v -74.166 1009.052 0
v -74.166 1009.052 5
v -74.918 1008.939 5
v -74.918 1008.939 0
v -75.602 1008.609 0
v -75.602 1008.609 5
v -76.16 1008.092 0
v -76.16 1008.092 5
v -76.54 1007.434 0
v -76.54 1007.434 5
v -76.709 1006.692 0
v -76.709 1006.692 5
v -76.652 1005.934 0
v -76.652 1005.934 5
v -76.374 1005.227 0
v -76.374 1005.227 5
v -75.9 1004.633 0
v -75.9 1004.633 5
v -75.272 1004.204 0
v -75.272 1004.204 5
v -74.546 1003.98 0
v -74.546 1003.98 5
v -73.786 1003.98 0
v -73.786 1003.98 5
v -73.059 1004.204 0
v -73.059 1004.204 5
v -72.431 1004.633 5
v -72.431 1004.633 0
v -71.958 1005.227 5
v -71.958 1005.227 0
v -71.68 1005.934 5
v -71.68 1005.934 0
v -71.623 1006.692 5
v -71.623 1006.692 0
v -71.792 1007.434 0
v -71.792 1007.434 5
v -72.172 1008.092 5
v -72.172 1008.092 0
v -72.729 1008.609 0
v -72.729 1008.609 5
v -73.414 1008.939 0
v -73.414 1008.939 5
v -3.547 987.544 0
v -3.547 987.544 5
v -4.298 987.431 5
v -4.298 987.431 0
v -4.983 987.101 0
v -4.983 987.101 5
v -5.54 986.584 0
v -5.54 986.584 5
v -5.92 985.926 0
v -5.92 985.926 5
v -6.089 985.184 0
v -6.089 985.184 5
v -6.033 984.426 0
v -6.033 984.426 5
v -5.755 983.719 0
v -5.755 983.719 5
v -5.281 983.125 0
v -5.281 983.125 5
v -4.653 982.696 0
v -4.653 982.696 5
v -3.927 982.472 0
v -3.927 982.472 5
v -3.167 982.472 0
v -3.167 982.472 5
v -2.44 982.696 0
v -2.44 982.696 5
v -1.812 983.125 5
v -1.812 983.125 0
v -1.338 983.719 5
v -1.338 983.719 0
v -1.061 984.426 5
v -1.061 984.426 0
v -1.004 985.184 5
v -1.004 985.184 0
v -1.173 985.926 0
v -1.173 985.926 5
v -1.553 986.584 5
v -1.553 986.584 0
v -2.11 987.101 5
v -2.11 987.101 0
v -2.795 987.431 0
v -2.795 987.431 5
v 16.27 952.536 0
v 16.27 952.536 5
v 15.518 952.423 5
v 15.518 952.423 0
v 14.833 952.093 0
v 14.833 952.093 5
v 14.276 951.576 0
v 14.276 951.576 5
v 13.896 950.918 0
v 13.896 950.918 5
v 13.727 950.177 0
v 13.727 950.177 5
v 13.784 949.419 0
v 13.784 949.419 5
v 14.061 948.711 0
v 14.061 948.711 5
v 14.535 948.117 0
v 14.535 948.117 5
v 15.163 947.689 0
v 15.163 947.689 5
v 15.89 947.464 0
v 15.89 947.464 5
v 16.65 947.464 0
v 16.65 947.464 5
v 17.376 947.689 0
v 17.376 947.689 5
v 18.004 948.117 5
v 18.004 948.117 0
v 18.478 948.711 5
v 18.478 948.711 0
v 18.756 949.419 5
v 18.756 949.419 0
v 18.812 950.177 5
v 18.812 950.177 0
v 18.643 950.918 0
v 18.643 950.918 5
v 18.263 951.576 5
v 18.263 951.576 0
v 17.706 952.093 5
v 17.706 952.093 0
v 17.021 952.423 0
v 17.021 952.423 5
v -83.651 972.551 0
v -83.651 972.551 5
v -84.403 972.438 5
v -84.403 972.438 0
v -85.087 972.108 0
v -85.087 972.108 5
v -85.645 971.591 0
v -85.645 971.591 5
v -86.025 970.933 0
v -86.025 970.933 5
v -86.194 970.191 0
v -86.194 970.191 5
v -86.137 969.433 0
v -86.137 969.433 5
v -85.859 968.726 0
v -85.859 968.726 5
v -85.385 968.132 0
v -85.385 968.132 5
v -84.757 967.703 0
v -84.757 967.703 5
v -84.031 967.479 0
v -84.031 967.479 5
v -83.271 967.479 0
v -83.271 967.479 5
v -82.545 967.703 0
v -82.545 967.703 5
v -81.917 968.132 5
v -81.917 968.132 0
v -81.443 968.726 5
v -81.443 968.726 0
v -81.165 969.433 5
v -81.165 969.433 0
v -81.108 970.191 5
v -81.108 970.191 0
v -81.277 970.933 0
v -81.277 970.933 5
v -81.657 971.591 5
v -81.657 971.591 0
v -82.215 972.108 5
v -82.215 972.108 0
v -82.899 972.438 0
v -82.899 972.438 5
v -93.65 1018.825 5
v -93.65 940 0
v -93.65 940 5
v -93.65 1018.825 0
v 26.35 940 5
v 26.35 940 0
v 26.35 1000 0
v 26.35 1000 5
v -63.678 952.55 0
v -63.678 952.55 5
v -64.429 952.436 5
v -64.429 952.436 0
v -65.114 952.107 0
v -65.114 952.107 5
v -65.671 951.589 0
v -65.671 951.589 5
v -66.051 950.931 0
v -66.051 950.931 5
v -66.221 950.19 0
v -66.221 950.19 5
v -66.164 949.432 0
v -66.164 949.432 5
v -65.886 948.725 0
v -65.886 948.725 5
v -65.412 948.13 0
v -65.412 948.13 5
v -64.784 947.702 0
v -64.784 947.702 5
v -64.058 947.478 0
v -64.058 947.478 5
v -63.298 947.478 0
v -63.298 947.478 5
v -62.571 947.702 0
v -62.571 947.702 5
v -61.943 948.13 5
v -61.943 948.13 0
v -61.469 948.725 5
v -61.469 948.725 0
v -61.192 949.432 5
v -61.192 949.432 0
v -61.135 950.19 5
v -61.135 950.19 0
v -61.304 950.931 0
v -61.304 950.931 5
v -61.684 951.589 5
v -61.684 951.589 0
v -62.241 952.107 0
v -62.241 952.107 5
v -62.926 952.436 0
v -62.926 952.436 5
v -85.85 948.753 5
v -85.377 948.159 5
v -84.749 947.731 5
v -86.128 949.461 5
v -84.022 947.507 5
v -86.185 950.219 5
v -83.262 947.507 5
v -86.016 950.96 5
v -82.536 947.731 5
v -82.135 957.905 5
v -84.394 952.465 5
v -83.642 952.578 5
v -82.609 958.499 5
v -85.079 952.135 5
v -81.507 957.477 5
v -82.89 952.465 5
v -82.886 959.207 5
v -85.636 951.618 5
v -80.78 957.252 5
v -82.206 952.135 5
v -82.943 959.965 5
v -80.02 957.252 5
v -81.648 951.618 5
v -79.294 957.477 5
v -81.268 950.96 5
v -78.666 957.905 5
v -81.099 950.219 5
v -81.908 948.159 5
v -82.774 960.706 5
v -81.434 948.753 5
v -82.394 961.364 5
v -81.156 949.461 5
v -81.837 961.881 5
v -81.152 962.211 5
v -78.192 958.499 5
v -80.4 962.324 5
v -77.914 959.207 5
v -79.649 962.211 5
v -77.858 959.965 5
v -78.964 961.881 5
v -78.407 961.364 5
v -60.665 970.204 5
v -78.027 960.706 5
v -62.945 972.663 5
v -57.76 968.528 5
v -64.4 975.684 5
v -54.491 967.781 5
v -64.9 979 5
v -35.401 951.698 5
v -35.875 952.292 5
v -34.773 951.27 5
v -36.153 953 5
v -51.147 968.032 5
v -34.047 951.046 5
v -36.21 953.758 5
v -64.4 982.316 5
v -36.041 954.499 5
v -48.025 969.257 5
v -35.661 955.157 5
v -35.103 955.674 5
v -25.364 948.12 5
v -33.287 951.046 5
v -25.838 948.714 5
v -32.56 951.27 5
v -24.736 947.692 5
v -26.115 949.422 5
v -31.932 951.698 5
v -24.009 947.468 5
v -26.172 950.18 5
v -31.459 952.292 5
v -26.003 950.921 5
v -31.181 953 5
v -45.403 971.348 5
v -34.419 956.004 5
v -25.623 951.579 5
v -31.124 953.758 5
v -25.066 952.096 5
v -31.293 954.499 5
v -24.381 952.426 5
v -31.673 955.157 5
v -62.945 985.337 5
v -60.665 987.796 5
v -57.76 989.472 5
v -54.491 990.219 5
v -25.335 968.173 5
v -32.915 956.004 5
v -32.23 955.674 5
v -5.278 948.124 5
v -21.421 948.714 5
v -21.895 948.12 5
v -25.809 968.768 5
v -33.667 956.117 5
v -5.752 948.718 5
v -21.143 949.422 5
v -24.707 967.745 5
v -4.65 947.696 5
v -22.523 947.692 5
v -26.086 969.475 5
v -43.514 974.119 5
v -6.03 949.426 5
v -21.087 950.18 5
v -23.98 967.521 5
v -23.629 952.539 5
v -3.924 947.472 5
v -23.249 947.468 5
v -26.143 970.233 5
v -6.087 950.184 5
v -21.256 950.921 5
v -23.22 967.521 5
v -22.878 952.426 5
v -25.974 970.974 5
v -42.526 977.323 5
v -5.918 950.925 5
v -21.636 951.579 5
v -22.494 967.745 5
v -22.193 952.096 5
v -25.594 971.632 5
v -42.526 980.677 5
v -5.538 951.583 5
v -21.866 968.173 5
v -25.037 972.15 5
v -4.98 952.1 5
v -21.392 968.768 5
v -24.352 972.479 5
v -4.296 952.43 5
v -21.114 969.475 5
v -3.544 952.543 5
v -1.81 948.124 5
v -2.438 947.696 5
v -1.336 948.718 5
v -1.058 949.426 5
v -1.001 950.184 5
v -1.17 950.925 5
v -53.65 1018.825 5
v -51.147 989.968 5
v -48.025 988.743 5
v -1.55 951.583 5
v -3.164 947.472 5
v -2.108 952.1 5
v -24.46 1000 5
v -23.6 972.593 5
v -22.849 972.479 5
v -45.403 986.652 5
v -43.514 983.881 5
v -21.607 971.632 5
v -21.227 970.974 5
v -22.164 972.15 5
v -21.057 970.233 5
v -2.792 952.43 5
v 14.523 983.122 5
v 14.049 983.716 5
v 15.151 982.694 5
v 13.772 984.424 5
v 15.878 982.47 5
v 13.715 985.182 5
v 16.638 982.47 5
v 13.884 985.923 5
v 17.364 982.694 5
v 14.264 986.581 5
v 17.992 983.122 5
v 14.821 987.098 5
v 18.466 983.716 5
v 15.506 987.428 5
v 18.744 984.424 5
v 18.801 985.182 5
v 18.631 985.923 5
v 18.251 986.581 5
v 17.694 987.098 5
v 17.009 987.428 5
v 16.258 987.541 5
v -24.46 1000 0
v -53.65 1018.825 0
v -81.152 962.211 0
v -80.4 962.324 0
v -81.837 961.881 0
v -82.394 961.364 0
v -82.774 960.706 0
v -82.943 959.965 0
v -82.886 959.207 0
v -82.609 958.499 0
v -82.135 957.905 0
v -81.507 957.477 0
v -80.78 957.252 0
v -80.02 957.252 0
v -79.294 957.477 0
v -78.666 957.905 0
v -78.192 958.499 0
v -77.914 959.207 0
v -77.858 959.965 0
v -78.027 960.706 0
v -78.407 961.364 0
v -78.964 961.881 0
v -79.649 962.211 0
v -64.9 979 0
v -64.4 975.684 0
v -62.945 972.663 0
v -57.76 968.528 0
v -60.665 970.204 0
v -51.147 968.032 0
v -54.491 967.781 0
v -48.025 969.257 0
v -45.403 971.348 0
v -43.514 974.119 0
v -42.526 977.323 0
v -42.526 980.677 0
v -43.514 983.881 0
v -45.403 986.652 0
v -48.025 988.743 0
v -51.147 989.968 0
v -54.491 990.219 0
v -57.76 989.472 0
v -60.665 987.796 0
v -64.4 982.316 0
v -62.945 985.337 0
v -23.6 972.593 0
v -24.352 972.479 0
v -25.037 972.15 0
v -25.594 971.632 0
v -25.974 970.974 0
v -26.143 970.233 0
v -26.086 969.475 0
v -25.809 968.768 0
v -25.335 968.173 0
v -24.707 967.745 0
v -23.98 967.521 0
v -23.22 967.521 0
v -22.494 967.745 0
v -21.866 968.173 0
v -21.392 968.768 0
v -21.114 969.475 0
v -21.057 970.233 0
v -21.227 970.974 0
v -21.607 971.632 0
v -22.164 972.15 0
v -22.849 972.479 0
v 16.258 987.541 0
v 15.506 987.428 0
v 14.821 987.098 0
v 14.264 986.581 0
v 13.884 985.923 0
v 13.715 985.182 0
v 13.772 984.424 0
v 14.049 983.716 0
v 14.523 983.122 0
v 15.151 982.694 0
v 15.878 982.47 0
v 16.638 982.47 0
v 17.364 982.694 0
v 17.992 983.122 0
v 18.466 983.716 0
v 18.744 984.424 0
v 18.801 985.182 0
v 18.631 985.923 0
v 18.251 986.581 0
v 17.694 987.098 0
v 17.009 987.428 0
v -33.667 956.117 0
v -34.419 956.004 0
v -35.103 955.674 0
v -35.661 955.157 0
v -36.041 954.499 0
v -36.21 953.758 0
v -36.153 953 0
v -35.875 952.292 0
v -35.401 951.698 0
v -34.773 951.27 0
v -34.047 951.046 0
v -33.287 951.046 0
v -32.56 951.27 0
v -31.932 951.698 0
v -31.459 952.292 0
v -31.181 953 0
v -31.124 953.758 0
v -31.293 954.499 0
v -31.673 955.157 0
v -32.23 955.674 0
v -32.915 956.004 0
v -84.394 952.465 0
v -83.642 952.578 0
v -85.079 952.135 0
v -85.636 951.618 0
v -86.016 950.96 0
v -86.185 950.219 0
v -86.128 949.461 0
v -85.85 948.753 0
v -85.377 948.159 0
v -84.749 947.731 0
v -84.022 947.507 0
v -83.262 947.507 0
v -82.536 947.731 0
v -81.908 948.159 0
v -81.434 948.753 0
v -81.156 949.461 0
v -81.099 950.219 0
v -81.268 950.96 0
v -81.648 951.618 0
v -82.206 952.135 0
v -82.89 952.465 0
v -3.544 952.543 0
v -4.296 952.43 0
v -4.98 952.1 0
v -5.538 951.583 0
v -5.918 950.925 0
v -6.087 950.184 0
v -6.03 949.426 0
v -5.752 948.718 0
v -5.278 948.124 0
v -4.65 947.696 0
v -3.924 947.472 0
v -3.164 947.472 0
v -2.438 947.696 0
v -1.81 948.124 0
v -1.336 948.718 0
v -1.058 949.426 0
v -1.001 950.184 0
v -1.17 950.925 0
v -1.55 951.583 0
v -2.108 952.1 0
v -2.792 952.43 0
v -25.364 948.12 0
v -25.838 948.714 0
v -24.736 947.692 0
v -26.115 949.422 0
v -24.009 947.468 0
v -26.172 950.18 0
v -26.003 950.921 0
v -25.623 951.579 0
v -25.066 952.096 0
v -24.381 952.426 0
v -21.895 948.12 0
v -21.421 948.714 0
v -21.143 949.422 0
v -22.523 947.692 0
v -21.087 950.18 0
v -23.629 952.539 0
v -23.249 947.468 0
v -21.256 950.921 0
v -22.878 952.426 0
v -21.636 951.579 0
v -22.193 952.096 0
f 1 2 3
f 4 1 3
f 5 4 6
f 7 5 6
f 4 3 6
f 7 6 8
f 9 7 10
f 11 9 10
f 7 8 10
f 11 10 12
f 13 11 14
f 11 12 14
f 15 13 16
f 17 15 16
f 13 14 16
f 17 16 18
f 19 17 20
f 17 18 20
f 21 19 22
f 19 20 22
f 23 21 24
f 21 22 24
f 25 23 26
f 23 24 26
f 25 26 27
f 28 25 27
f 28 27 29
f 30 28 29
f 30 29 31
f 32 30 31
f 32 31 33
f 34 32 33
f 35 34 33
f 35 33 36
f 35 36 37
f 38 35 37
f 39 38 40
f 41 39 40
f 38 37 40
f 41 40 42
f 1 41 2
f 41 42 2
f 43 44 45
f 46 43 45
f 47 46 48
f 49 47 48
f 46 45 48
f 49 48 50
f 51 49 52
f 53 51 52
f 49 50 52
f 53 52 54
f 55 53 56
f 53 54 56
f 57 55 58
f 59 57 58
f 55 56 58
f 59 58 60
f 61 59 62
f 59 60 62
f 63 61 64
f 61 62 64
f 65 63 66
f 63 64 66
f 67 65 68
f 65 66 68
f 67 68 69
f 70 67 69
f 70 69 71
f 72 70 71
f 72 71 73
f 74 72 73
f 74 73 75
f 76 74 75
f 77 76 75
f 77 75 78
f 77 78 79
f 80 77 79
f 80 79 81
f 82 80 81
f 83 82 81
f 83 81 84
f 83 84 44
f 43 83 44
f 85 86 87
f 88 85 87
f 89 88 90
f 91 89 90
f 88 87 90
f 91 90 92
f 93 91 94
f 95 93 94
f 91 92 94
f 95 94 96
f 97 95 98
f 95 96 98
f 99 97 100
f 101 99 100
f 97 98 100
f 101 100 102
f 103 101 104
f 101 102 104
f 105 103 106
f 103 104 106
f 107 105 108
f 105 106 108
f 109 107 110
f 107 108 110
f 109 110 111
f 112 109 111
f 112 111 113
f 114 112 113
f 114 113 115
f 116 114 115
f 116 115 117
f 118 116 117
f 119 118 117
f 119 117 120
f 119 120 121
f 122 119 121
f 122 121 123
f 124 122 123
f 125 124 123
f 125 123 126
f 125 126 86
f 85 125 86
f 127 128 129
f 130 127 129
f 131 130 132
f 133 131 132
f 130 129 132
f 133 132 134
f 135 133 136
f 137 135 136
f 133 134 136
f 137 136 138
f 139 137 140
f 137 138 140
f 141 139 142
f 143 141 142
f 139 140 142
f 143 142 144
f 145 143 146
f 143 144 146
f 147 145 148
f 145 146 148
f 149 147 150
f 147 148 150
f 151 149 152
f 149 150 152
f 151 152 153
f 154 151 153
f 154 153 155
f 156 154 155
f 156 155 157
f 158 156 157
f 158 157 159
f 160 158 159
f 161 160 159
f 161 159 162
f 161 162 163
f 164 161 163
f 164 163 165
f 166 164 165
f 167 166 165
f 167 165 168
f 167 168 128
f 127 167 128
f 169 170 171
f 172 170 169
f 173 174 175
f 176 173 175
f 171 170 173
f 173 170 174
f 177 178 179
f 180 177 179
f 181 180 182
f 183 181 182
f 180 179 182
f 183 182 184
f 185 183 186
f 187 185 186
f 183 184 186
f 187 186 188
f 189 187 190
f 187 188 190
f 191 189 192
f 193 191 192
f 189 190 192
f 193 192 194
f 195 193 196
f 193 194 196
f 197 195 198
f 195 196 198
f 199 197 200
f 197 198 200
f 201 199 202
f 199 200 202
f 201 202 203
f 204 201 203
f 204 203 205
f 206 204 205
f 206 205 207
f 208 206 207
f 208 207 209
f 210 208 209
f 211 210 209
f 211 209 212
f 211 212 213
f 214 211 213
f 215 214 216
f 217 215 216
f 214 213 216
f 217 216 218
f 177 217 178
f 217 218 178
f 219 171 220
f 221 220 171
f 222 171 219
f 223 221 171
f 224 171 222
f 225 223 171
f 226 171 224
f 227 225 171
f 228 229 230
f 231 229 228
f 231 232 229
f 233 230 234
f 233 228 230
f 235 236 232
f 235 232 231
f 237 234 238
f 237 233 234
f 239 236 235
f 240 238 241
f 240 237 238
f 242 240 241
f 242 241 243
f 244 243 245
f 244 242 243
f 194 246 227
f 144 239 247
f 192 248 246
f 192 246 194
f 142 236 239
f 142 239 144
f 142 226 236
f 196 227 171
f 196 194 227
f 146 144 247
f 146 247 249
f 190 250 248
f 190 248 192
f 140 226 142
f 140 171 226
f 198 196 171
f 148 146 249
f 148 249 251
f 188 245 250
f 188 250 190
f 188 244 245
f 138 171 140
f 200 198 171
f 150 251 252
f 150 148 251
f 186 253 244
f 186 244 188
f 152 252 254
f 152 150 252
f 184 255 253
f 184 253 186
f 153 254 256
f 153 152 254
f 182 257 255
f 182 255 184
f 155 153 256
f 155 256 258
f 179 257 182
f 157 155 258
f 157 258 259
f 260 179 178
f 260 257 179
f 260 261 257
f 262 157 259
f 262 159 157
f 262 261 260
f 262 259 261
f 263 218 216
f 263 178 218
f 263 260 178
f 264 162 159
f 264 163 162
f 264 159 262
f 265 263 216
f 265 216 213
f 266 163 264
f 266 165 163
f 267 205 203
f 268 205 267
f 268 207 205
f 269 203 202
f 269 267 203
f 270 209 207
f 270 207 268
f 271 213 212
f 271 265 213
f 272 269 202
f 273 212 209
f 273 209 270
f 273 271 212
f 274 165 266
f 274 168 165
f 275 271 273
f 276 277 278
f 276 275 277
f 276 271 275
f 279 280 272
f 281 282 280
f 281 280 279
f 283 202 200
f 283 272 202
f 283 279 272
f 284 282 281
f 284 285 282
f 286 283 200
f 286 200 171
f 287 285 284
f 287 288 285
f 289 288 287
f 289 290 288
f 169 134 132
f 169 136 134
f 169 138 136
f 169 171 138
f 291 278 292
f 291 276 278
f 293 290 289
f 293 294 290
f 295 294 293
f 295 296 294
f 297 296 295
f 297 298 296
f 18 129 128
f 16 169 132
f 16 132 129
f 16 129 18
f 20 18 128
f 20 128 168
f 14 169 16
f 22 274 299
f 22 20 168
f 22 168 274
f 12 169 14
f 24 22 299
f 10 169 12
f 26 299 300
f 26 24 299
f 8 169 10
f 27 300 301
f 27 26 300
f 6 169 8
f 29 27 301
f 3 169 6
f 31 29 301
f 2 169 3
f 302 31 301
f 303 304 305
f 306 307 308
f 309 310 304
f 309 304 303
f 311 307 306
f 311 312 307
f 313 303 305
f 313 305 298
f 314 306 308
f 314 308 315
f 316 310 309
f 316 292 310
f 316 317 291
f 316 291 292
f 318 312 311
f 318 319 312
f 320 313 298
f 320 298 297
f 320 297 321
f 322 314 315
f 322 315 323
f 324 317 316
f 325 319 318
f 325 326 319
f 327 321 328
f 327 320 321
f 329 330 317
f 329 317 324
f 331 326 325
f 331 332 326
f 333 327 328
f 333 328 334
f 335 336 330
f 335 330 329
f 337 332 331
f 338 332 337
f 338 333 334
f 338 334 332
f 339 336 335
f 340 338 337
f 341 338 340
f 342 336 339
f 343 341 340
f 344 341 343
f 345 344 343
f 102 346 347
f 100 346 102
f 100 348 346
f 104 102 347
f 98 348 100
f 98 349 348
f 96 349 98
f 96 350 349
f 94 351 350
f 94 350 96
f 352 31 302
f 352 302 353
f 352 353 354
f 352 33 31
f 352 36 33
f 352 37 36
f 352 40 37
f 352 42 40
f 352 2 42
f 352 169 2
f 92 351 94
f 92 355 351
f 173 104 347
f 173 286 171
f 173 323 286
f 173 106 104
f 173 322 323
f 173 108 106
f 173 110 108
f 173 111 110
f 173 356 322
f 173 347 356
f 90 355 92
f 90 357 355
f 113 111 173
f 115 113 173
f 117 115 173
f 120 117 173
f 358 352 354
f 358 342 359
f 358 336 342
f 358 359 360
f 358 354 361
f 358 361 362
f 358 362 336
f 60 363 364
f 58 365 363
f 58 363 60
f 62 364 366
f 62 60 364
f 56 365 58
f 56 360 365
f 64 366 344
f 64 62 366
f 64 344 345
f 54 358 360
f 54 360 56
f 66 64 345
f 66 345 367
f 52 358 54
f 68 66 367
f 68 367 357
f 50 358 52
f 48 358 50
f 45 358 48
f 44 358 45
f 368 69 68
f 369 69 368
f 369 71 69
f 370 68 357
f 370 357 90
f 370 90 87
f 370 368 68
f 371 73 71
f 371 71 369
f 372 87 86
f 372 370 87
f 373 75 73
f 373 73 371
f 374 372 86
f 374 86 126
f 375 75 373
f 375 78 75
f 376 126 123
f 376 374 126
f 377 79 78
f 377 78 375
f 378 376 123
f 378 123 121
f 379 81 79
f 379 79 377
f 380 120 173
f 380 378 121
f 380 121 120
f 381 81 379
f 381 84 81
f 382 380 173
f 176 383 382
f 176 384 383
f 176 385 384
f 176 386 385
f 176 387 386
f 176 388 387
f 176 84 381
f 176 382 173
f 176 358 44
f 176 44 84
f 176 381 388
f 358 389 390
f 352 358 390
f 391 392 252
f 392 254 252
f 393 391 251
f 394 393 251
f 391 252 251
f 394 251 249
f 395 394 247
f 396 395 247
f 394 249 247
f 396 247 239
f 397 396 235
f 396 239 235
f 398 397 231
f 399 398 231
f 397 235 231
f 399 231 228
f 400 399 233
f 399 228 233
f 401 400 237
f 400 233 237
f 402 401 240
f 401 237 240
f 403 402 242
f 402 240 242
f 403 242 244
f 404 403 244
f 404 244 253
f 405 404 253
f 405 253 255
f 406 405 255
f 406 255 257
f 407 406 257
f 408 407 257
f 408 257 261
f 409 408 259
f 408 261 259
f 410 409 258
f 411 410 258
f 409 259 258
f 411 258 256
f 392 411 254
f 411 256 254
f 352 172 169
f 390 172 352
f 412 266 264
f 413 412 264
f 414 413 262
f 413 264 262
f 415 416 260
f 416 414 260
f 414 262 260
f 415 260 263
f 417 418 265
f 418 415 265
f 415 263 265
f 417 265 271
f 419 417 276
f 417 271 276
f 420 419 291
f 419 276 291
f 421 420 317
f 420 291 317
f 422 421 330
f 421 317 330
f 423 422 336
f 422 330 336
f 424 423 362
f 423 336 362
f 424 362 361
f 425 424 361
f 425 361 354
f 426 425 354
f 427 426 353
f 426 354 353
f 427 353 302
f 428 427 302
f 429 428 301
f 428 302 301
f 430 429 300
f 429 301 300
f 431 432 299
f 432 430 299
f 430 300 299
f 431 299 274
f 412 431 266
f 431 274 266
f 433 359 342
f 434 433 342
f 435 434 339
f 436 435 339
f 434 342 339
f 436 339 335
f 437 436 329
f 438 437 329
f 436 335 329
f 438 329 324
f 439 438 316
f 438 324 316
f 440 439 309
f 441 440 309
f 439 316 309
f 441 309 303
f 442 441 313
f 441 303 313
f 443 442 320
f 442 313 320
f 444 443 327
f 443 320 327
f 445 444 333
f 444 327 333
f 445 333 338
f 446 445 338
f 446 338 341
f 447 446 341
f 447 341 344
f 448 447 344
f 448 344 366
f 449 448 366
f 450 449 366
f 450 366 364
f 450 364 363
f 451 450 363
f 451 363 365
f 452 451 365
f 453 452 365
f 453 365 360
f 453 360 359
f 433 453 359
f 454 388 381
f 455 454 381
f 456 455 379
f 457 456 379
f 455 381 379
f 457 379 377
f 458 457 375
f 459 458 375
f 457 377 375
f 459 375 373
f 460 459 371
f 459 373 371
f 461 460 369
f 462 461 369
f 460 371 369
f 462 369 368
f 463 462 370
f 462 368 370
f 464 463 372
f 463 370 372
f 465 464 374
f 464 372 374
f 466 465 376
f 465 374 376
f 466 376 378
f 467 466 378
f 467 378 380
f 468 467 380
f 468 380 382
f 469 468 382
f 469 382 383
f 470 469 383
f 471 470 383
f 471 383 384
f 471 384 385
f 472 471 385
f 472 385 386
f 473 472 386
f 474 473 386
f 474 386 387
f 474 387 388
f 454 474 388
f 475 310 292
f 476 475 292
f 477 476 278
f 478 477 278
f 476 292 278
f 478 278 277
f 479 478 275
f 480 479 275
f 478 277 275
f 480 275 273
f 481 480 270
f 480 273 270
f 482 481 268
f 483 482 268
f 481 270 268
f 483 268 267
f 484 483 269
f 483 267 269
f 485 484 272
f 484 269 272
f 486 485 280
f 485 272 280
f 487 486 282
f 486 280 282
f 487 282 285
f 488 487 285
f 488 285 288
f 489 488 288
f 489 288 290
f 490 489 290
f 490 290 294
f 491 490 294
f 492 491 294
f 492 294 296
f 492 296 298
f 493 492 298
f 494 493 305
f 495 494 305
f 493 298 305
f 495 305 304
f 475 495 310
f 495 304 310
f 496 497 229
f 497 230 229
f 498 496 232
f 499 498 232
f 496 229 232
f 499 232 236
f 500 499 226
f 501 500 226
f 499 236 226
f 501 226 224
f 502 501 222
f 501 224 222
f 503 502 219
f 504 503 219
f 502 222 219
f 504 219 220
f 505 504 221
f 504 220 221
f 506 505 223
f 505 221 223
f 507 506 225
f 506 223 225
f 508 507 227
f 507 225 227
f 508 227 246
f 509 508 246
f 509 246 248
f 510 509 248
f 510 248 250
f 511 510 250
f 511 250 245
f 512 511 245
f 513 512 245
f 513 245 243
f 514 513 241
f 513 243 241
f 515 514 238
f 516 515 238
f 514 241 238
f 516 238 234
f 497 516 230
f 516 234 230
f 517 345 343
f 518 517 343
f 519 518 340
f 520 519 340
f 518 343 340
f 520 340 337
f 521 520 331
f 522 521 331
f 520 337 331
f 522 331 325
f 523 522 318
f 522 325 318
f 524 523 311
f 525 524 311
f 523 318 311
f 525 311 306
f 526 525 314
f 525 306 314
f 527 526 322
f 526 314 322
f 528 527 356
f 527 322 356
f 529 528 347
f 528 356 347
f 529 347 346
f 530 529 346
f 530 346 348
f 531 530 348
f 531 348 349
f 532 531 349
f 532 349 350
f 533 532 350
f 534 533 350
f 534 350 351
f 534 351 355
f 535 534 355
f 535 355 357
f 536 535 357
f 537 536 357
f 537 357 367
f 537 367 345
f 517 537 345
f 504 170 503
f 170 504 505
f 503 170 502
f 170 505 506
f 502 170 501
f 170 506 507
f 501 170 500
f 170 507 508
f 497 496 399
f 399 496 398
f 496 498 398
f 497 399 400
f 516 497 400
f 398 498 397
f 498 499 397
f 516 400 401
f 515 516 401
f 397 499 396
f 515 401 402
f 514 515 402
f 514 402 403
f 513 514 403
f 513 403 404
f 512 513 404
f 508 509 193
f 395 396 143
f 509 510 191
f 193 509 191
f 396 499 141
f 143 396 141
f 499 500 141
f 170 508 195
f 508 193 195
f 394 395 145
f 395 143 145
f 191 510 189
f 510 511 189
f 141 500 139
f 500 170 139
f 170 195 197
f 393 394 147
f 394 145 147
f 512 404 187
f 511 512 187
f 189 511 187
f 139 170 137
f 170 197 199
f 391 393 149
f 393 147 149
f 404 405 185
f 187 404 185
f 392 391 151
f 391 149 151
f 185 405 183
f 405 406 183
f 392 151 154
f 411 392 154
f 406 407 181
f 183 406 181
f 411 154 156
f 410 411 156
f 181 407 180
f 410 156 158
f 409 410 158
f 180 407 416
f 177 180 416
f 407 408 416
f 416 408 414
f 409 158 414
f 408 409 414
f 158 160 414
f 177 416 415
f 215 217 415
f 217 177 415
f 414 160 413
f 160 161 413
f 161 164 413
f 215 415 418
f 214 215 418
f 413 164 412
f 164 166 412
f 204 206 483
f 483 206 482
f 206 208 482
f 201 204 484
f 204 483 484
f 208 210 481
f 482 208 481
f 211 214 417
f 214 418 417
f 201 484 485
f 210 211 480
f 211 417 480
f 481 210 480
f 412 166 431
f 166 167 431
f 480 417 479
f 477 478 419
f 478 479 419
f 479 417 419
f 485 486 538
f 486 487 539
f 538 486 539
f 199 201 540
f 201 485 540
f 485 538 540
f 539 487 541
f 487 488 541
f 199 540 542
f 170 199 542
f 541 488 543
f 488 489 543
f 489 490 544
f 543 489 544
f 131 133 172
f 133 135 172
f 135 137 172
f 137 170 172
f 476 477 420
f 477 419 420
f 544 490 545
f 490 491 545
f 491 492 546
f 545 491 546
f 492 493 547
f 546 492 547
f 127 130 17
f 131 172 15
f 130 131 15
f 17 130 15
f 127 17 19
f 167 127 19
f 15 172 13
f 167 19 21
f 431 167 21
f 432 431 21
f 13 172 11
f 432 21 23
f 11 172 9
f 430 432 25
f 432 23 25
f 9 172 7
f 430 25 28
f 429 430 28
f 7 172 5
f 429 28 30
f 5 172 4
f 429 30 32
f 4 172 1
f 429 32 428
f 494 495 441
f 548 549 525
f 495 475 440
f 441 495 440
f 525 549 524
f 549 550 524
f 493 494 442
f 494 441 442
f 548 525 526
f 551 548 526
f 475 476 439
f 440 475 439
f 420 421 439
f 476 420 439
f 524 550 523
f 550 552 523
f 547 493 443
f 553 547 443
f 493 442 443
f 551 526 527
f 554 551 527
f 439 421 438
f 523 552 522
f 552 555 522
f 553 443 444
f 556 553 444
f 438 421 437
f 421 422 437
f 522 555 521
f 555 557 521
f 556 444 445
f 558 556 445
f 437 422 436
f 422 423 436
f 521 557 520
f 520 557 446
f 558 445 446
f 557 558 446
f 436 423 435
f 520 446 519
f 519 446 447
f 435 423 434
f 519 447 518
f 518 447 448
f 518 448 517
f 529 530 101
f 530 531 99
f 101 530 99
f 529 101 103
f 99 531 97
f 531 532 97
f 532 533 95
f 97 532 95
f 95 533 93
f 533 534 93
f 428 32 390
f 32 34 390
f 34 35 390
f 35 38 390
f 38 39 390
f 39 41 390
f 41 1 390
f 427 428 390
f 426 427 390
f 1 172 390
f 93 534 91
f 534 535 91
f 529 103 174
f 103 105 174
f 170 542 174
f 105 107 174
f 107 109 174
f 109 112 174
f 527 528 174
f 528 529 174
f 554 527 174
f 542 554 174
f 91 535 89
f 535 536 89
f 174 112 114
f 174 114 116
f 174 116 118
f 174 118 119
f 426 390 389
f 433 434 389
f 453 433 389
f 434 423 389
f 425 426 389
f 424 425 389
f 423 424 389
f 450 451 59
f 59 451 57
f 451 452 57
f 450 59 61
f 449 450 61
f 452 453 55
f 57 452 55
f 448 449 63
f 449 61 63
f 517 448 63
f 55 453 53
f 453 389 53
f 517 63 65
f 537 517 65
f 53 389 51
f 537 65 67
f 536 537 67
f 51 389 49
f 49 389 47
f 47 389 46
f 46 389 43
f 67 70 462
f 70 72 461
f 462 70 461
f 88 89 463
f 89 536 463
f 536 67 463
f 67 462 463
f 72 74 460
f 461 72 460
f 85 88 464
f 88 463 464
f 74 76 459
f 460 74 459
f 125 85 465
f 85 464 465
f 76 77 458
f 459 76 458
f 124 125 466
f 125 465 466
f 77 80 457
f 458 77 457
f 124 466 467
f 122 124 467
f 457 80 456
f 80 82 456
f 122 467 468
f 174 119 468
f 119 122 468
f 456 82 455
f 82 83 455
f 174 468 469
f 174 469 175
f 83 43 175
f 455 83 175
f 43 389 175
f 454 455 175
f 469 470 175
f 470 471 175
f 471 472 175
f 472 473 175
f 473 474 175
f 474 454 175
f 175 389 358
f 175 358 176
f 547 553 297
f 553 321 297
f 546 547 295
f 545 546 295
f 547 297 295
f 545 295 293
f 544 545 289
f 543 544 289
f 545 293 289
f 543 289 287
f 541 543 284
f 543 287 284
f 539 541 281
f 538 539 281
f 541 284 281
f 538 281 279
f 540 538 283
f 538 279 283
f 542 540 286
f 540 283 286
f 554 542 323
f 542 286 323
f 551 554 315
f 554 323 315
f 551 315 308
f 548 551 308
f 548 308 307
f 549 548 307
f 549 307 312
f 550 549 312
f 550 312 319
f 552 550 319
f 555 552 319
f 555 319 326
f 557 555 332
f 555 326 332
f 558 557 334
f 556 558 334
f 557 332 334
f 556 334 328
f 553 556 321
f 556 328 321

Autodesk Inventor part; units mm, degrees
ref_plane "YZ Plane" through (0, 0, 0) normal (1, 0, 0) x (0, 1, 0)
ref_plane "XZ Plane" through (0, 0, 0) normal (0, 1, 0) x (-1, 0, 0)
ref_plane "Work Plane1" through (0, 0, 0) normal (0, 0, 1) x (1, 0, 0)
sketch "Sketch1" plane through (0, 0, 0) normal (0, 0, 1) x (1, 0, 0)
  circle A0 centre (-83.6503, 950) radius 2.1 projected
  circle A1 centre (-83.6503, 970) radius 2.1 projected
  circle A2 centre (-63.6503, 950) radius 2.1 projected
  circle A3 centre (-43.6503, 950) radius 2.1 projected
  circle A4 centre (-23.6503, 950) radius 2.1 projected
  circle A5 centre (-23.6503, 970) radius 2.1 projected
  line L0 (-3.55, 0) -> (-3.55, 1000) projected
  line L1 (16.25, 0) -> (16.25, 1000) projected
  line L2 (-58.7503, 960) -> (-48.5503, 960) projected
  line L3 (-73.6503, 979.5) -> (-73.6503, 974.8314) projected
  line L4 (-78.7503, 980) -> (-74.1503, 980) projected
  line L5 (-33.6503, 974.8314) -> (-33.6503, 979.5) projected
  line L6 (-33.1503, 980) -> (-28.5503, 980) projected
  line L7 (-33.6503, 960) -> (-33.6503, 965.1685) projected
  line L8 (-38.7503, 960) -> (-33.6503, 960) projected
  line L9 (-73.6503, 960) -> (-68.5503, 960) projected
  line L10 (-73.6503, 965.1685) -> (-73.6503, 960) projected
  line L11 (-93.1503, 980) -> (-88.5503, 980) projected
  line L12 (-93.6503, 974.8314) -> (-93.6503, 979.5) projected
  line L13 (-93.6503, 960.207) -> (-93.6386, 965.287) projected
  line L14 (-93.6503, 954.8314) -> (-93.6503, 959.793) projected
  line L15 (-93.6503, 940.5) -> (-93.6503, 945.1685) projected
  line L16 (-88.4817, 940) -> (-93.1503, 940) projected
  line L17 (-14.1503, 940) -> (-18.8188, 940) projected
  circle A6 centre (-3.55, 950) radius 2.55
  circle A7 centre (16.25, 950) radius 2.55
  line L18 (26.35, 0) -> (26.35, 1000) projected
  line L19 (-14.1503, 940) -> (26.35, 940)
  line L20 (-14.1503, 940) -> (-93.1503, 940)
  line L21 (-33.6503, 960) -> (-33.7332, 960)
  line L22 (-14.15, 1000) -> (26.35, 1000)
  line L23 (26.35, 940) -> (26.35, 1000)
  line L24 (-33.6503, 960) -> (-33.6503, 960.1732)
  line L25 (-93.1503, 940) -> (-93.6503, 940)
  line L26 (-93.6503, 940) -> (-93.6503, 980)
  line L27 (-93.6503, 980) -> (-93.1503, 980)
  line L28 (-93.6503, 950) -> (27.9251, 950) construction
  circle A8 centre (-3.55, 985) radius 2.55
  circle A9 centre (16.25, 985) radius 2.55
  circle A10 centre (-80.3911, 959.775) radius 2.5
  circle A11 centre (-74.1633, 1006.5119) radius 2.5
  circle A12 centre (-33.6542, 953.5473) radius 2.5
  line L29 (-85.3287, 955.7671) -> (-21.9733, 1004.2234) construction
  line L30 (-29.4228, 948.3176) -> (-77.6558, 1011.3809) construction
  line L31 (-24.4599, 1000) -> (-14.15, 1000)
  line L32 (-93.6503, 980) -> (-93.6503, 1018.8249)
  line L33 (-93.6503, 1018.8249) -> (-53.65, 1018.8249)
  line L34 (-24.4599, 1000) -> (-53.65, 1018.8249)
  line L35 (-53.6502, 925.444) -> (-53.6503, 1034.9111) construction
  line L36 (-107.7091, 987) -> (-12.8224, 987) construction
  line L37 (-76.4503, 980) -> (8.1353, 980) construction
  line L38 (-33.6542, 953.5473) -> (-80.3911, 959.775) construction
  circle A13 centre (-53.6503, 980) radius 11.05
  circle A14 centre (-83.6503, 970) radius 2.55
  circle A15 centre (-83.6503, 950) radius 2.55
  circle A16 centre (-23.6503, 950) radius 2.55
  circle A17 centre (-63.6503, 950) radius 2.55
  circle A18 centre (-23.6503, 970) radius 2.55
  point P0 (0, 0)
  point P1 (-53.65, 970.886)
  point P2 (-93.65, 979.5)
  point P3 (-93.65, 974.8315)
  point P4 (-93.65, 959.793)
  point P5 (-93.65, 954.8315)
  point P6 (-93.65, 945.1686)
  point P7 (-93.65, 940.5)
  point P8 (-88.4815, 940)
  point P9 (-18.8186, 940)
  point P10 (-88.4816, 940)
  dimension "d0" = 5.1
  dimension "d2" = 5.1
  dimension "d9" = 5.1
  dimension "d10" = 15
  dimension "d11" = 15
  dimension "d17" = 47.15
  dimension "d22" = 5
  dimension "d23" = 5
  dimension "d24" = 5
  dimension "d29" = 20
  dimension "d30" = 7
  dimension "d31" = 47.15
  dimension "d32" = 22.1
  dimension "d33" = 5.1
  dimension "d34" = 5.1
  dimension "d35" = 5.1
  dimension "d36" = 5.1
  dimension "d37" = 5.1
extrude "Extrusion1" add sketch "Sketch1" along normal blind 5 contours A0 | A1 | A2 | A3 | A4 | A5 | L19 L17 L20 L16 L25 L26 L15 L14 L12 L32 L33 L34 L31 L22 L0 A8 A6 | L0 A6 A8 L22 L1 A9 A7 L19 | A6 L0 | L0 A6 | L1 A7 A9 L22 L18 L19 | A7 L1 | L1 A7 | A8 L0 | L0 A8 | A9 L1 | L1 A9 | A10 | A11 | A12 | A13 | A14 | A15 | A16 | A17 | A18
sketch "Sketch6" plane through (0, 0, 0) normal (0, 0, -1) x (-1, 0, 0)
  point P0 (0, 0)
  point P1 (83.6421, 950.0283)
  point P2 (63.6777, 949.9996)
  point P3 (23.6294, 949.9891)
  point P4 (3.544, 949.9934)
  point P5 (-16.2696, 949.986)
  point P6 (-16.2577, 984.9913)
  point P7 (3.5466, 984.9939)
  point P8 (74.1659, 1006.5019)
  point P9 (83.651, 970.0009)
  point P10 (80.4004, 959.774)
  point P11 (33.6669, 953.5674)
  point P12 (23.6003, 970.0426)
hole "Hole3" at (-83.6421, 950.0283, 0) at (-63.6777, 949.9996, 0) at (-23.6294, 949.9891, 0) at (-3.544, 949.9934, 0) at (16.2696, 949.986, 0) at (16.2577, 984.9913, 0) at (-3.5466, 984.9939, 0) at (-74.1659, 1006.5019, 0) at (-83.651, 970.0009, 0) at (-80.4004, 959.774, 0) at (-33.6669, 953.5674, 0) at (-23.6003, 970.0426, 0) direction (0, 0, 1) diameter 5.1 end through all
sketch "Sketch7" plane through (0, 0, 5) normal (0, 0, -1) x (-1, 0, 0)
  circle A0 centre (53.6503, 979) radius 4 projected
  circle A1 centre (53.6503, 979) radius 11.25
  point P0 (0, 0)
  dimension "d59" = 22.5
extrude "Extrusion2" cut sketch "Sketch7" along normal blind 5 contours A0 | A1
properties part number "Y axis motor mount_3DPrint"
